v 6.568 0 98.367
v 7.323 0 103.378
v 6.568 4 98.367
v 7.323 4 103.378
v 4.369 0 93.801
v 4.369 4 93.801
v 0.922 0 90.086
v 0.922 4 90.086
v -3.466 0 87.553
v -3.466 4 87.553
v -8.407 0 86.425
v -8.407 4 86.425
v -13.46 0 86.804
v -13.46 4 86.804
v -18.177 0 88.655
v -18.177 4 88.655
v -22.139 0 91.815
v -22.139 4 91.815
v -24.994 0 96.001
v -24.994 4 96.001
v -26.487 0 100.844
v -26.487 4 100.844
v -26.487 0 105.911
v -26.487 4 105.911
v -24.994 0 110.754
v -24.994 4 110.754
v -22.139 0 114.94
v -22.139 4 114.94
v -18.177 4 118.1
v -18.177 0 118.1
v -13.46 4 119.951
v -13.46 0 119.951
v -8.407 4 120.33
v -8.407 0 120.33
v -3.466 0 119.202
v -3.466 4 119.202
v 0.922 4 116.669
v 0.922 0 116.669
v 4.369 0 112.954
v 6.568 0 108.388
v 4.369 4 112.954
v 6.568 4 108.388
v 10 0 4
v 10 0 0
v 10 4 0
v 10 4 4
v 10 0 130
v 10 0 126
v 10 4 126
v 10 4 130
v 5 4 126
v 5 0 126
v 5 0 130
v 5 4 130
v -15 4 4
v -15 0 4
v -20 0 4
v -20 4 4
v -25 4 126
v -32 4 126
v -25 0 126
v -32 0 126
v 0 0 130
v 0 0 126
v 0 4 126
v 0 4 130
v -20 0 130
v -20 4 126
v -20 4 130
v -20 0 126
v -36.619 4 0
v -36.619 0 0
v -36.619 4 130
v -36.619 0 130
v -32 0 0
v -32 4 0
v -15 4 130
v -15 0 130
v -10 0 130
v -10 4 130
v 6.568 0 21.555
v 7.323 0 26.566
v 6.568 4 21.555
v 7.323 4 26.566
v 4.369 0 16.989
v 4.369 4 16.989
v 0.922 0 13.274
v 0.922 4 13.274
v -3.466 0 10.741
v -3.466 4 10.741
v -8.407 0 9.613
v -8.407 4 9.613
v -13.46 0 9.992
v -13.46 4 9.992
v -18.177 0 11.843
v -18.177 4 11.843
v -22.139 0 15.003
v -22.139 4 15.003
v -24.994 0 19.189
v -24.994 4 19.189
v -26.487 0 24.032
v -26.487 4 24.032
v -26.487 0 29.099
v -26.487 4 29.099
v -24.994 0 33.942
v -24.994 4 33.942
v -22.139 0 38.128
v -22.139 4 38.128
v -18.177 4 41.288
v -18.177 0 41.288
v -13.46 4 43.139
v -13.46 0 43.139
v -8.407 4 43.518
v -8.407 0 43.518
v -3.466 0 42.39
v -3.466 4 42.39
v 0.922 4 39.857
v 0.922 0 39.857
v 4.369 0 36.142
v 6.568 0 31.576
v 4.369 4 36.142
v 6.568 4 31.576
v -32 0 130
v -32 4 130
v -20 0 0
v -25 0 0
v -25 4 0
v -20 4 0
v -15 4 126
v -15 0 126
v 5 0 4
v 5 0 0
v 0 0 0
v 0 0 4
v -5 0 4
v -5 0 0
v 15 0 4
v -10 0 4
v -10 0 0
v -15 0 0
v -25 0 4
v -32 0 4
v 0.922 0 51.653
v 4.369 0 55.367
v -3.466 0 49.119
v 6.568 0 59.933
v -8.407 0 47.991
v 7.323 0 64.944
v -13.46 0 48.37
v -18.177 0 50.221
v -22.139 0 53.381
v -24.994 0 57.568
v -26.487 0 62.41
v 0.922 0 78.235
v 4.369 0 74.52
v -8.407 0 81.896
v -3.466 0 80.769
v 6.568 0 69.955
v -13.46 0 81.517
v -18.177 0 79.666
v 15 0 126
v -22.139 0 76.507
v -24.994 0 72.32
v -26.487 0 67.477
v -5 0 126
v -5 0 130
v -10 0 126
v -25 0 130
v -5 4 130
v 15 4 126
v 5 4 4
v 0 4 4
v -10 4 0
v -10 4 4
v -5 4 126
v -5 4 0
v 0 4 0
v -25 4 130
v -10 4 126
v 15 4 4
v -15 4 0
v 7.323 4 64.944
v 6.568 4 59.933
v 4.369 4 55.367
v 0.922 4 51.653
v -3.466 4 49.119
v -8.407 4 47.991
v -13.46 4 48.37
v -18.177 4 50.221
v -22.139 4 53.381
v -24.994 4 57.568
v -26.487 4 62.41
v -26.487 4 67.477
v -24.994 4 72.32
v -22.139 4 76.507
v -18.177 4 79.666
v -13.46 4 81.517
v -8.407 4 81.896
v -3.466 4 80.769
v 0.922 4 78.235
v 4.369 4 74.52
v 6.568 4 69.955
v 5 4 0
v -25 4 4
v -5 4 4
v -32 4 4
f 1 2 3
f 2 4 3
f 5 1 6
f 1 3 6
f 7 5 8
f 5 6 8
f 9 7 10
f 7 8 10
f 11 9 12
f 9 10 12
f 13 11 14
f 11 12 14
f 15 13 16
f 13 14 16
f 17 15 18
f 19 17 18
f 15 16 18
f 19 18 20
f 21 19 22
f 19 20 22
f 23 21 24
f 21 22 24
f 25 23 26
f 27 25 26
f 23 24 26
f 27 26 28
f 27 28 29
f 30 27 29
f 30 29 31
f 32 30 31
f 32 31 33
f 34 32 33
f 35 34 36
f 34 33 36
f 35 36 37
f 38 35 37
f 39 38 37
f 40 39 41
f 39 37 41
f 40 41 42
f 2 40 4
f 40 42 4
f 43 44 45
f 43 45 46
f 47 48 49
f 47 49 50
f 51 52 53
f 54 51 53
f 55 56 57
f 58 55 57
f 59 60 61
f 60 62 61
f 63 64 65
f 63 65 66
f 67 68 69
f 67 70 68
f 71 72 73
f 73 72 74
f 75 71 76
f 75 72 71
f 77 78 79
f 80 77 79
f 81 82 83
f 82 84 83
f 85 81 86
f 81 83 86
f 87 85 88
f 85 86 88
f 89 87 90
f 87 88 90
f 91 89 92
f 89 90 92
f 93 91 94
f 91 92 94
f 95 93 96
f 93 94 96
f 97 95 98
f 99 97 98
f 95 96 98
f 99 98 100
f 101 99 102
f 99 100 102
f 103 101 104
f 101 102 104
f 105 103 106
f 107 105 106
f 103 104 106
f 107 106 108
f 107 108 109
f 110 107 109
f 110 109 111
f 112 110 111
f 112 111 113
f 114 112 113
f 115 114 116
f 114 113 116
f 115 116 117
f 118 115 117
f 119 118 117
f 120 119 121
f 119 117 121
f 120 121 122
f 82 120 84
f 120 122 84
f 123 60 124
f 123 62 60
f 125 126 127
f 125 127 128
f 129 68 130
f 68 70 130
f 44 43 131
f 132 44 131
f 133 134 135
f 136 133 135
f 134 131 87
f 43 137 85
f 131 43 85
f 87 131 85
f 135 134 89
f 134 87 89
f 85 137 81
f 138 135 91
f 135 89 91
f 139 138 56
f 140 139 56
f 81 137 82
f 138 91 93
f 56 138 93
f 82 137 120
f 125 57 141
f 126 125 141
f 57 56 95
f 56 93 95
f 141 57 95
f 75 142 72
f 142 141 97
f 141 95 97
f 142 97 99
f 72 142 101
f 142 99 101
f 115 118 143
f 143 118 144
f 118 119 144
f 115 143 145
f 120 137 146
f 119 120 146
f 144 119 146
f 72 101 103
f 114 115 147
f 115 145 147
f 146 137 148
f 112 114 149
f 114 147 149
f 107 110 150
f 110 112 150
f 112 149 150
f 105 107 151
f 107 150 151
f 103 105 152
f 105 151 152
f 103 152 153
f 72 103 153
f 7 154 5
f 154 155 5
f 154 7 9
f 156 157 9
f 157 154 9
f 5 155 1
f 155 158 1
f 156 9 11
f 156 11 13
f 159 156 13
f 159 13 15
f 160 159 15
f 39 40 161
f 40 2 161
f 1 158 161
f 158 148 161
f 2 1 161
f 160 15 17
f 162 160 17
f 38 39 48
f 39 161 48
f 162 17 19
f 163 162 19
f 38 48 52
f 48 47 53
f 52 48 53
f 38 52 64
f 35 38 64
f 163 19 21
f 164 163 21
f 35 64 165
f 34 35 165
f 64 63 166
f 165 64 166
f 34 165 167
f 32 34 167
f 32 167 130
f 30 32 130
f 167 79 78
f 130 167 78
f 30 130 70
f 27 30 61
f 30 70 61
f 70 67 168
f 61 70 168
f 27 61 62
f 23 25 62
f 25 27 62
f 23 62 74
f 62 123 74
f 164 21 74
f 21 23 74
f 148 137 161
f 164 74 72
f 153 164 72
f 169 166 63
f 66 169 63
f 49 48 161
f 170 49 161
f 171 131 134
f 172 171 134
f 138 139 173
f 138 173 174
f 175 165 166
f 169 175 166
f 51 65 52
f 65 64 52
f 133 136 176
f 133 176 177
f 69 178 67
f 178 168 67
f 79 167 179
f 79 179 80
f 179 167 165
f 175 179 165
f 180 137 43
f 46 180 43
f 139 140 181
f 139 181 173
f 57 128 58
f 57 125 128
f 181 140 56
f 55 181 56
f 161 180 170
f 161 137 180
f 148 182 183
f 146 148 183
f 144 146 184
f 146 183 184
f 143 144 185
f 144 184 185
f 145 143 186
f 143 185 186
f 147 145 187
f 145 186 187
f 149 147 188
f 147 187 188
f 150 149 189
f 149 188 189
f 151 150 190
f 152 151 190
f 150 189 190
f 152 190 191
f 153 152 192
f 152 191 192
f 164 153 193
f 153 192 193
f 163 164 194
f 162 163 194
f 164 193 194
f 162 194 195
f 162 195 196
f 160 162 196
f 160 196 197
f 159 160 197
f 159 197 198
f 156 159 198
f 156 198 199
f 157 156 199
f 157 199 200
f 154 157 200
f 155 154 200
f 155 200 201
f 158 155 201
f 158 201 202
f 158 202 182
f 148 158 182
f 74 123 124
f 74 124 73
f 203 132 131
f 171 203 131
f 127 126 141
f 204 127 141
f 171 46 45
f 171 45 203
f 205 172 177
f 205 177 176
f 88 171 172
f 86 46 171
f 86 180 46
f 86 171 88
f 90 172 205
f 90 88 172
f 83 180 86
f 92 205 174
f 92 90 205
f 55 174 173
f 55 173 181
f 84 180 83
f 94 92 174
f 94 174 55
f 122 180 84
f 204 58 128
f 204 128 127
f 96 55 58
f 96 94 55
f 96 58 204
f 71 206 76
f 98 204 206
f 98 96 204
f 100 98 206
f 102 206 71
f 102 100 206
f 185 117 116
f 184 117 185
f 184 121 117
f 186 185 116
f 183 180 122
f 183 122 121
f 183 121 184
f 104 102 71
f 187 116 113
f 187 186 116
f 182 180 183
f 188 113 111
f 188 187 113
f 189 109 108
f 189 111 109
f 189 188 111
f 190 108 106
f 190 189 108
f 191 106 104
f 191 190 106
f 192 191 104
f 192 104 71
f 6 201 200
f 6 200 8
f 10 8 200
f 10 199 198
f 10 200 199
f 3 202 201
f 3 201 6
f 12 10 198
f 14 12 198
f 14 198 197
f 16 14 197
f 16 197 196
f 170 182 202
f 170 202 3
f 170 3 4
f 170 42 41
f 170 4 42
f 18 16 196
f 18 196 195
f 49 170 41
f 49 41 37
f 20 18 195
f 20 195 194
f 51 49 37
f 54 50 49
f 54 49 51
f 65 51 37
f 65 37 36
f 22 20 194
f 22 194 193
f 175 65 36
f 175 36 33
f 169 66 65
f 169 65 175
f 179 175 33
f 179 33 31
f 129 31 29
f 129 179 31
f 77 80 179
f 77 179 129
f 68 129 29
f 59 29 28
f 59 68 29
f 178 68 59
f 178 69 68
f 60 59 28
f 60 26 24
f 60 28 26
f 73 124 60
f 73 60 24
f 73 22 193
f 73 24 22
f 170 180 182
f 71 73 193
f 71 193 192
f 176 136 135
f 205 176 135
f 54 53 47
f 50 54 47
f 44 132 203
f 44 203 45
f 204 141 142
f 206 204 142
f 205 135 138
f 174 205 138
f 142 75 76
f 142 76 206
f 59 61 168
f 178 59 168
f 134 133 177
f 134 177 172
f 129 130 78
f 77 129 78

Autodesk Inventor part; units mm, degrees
ref_plane "YZ Plane" through (0, 0, 0) normal (1, 0, 0) x (0, 1, 0)
ref_plane "XZ Plane" through (0, 0, 0) normal (0, 1, 0) x (-1, 0, 0)
sketch "Sketch1" plane through (0, 0, 0) normal (0, 1, 0) x (-1, 0, 0)
  line L0 (-15, 0) -> (-15, 130)
  line L1 (-10, 0) -> (-10, 4)
  line L2 (-15, 4) -> (-10, 4)
  line L3 (-5, 0) -> (-10, 0)
  line L4 (-5, 0) -> (-5, 4)
  line L5 (-5, 4) -> (0, 4)
  line L6 (0, 0) -> (0, 4)
  line L7 (5, 0) -> (0, 0)
  line L8 (5, 0) -> (5, 4)
  line L9 (5, 4) -> (10, 4)
  line L10 (10, 0) -> (10, 4)
  line L11 (15, 0) -> (10, 0)
  line L12 (15, 0) -> (15, 4)
  line L13 (15, 4) -> (20, 4)
  line L14 (25, 0) -> (20, 0)
  line L15 (20, 0) -> (20, 4)
  line L16 (25, 0) -> (25, 4)
  line L17 (25, 4) -> (32, 4)
  line L18 (32, 0) -> (32, 4)
  line L19 (36.6188, 0) -> (32, 0)
  line L20 (36.6188, 0) -> (36.6188, 4)
  line L21 (36.6188, 4) -> (36.6188, 126)
  line L22 (36.6188, 126) -> (36.6188, 130)
  line L23 (32, 130) -> (36.6188, 130)
  line L24 (32, 126) -> (32, 130)
  line L25 (32, 126) -> (25, 126)
  line L26 (25, 126) -> (25, 130)
  line L27 (25, 130) -> (20, 130)
  line L28 (20, 126) -> (20, 130)
  line L29 (20, 126) -> (15, 126)
  line L30 (15, 126) -> (15, 130)
  line L31 (15, 130) -> (10, 130)
  line L32 (10, 126) -> (10, 130)
  line L33 (10, 126) -> (5, 126)
  line L34 (5, 126) -> (5, 130)
  line L35 (5, 130) -> (0, 130)
  line L36 (0, 126) -> (0, 130)
  line L37 (0, 126) -> (-5, 126)
  line L38 (-5, 126) -> (-5, 130)
  line L39 (-5, 130) -> (-10, 130)
  line L40 (-10, 126) -> (-10, 130)
  line L41 (-10, 126) -> (-15, 126)
extrude "Extrusion1" add sketch "Sketch1" along normal blind 4
ref_plane "Work Plane1" through (15, 4, 130) normal (0.5, 0.866, 0) x (0, 0, -1)
sketch "Sketch5" plane through (0, 4, 0) normal (0, 1, 0) x (1, 0, 0)
  line L0 (10, 0) -> (5, 0) projected
  line L1 (5, 0) -> (5, -4) projected
  line L2 (5, -4) -> (0, -4) projected
  line L3 (0, -4) -> (0, 0) projected
  line L4 (0, 0) -> (-5, 0) projected
  line L5 (-5, 0) -> (-5, -4) projected
  line L6 (-5, -4) -> (-10, -4) projected
  line L7 (-10, -4) -> (-10, 0) projected
  line L8 (-10, 0) -> (-15, 0) projected
  line L9 (-15, 0) -> (-15, -4) projected
  line L10 (-15, -4) -> (-20, -4) projected
  line L11 (-20, -4) -> (-20, 0) projected
  line L12 (-20, 0) -> (-25, 0) projected
  line L13 (-25, 0) -> (-25, -4) projected
  line L14 (-25, -4) -> (-32, -4) projected
  line L15 (-32, -4) -> (-32, 0) projected
  line L16 (-32, 0) -> (-36.6188, 0) projected
  line L17 (-36.6188, 0) -> (-36.6188, -130) projected
  line L18 (-36.6188, -130) -> (-32, -130) projected
  line L19 (-32, -130) -> (-32, -126) projected
  line L20 (-32, -126) -> (-25, -126) projected
  line L21 (-25, -126) -> (-25, -130) projected
  line L22 (-25, -130) -> (-20, -130) projected
  line L23 (-20, -130) -> (-20, -126) projected
  line L24 (-20, -126) -> (-15, -126) projected
  line L25 (-15, -126) -> (-15, -130) projected
  line L26 (-15, -130) -> (-10, -130) projected
  line L27 (-10, -130) -> (-10, -126) projected
  line L28 (-10, -126) -> (-5, -126) projected
  line L29 (-5, -126) -> (-5, -130) projected
  line L30 (-5, -130) -> (0, -130) projected
  line L31 (0, -130) -> (0, -126) projected
  line L32 (0, -126) -> (5, -126) projected
  line L33 (5, -126) -> (5, -130) projected
  line L34 (5, -130) -> (10, -130) projected
  line L35 (10, -130) -> (10, -126) projected
  line L36 (10, -126) -> (15, -126) projected
  line L37 (15, -126) -> (15, -4) projected
  line L38 (15, -4) -> (10, -4) projected
  line L39 (10, -4) -> (10, 0) projected
sketch "Sketch6" plane through (0, 4, 0) normal (0, 1, 0) x (1, 0, 0)
  circle A0 centre (-9.6772, -26.5655) radius 17
  circle A1 centre (-9.6772, -64.9437) radius 17
  circle A2 centre (-9.6772, -103.3775) radius 17
  point P0 (0, 0)
  dimension "d16" = 34
  dimension "d17" = 34
  dimension "d18" = 34
extrude "Extrusion4" cut sketch "Sketch6" against normal blind 5.5
properties part number "Angle Cover"
